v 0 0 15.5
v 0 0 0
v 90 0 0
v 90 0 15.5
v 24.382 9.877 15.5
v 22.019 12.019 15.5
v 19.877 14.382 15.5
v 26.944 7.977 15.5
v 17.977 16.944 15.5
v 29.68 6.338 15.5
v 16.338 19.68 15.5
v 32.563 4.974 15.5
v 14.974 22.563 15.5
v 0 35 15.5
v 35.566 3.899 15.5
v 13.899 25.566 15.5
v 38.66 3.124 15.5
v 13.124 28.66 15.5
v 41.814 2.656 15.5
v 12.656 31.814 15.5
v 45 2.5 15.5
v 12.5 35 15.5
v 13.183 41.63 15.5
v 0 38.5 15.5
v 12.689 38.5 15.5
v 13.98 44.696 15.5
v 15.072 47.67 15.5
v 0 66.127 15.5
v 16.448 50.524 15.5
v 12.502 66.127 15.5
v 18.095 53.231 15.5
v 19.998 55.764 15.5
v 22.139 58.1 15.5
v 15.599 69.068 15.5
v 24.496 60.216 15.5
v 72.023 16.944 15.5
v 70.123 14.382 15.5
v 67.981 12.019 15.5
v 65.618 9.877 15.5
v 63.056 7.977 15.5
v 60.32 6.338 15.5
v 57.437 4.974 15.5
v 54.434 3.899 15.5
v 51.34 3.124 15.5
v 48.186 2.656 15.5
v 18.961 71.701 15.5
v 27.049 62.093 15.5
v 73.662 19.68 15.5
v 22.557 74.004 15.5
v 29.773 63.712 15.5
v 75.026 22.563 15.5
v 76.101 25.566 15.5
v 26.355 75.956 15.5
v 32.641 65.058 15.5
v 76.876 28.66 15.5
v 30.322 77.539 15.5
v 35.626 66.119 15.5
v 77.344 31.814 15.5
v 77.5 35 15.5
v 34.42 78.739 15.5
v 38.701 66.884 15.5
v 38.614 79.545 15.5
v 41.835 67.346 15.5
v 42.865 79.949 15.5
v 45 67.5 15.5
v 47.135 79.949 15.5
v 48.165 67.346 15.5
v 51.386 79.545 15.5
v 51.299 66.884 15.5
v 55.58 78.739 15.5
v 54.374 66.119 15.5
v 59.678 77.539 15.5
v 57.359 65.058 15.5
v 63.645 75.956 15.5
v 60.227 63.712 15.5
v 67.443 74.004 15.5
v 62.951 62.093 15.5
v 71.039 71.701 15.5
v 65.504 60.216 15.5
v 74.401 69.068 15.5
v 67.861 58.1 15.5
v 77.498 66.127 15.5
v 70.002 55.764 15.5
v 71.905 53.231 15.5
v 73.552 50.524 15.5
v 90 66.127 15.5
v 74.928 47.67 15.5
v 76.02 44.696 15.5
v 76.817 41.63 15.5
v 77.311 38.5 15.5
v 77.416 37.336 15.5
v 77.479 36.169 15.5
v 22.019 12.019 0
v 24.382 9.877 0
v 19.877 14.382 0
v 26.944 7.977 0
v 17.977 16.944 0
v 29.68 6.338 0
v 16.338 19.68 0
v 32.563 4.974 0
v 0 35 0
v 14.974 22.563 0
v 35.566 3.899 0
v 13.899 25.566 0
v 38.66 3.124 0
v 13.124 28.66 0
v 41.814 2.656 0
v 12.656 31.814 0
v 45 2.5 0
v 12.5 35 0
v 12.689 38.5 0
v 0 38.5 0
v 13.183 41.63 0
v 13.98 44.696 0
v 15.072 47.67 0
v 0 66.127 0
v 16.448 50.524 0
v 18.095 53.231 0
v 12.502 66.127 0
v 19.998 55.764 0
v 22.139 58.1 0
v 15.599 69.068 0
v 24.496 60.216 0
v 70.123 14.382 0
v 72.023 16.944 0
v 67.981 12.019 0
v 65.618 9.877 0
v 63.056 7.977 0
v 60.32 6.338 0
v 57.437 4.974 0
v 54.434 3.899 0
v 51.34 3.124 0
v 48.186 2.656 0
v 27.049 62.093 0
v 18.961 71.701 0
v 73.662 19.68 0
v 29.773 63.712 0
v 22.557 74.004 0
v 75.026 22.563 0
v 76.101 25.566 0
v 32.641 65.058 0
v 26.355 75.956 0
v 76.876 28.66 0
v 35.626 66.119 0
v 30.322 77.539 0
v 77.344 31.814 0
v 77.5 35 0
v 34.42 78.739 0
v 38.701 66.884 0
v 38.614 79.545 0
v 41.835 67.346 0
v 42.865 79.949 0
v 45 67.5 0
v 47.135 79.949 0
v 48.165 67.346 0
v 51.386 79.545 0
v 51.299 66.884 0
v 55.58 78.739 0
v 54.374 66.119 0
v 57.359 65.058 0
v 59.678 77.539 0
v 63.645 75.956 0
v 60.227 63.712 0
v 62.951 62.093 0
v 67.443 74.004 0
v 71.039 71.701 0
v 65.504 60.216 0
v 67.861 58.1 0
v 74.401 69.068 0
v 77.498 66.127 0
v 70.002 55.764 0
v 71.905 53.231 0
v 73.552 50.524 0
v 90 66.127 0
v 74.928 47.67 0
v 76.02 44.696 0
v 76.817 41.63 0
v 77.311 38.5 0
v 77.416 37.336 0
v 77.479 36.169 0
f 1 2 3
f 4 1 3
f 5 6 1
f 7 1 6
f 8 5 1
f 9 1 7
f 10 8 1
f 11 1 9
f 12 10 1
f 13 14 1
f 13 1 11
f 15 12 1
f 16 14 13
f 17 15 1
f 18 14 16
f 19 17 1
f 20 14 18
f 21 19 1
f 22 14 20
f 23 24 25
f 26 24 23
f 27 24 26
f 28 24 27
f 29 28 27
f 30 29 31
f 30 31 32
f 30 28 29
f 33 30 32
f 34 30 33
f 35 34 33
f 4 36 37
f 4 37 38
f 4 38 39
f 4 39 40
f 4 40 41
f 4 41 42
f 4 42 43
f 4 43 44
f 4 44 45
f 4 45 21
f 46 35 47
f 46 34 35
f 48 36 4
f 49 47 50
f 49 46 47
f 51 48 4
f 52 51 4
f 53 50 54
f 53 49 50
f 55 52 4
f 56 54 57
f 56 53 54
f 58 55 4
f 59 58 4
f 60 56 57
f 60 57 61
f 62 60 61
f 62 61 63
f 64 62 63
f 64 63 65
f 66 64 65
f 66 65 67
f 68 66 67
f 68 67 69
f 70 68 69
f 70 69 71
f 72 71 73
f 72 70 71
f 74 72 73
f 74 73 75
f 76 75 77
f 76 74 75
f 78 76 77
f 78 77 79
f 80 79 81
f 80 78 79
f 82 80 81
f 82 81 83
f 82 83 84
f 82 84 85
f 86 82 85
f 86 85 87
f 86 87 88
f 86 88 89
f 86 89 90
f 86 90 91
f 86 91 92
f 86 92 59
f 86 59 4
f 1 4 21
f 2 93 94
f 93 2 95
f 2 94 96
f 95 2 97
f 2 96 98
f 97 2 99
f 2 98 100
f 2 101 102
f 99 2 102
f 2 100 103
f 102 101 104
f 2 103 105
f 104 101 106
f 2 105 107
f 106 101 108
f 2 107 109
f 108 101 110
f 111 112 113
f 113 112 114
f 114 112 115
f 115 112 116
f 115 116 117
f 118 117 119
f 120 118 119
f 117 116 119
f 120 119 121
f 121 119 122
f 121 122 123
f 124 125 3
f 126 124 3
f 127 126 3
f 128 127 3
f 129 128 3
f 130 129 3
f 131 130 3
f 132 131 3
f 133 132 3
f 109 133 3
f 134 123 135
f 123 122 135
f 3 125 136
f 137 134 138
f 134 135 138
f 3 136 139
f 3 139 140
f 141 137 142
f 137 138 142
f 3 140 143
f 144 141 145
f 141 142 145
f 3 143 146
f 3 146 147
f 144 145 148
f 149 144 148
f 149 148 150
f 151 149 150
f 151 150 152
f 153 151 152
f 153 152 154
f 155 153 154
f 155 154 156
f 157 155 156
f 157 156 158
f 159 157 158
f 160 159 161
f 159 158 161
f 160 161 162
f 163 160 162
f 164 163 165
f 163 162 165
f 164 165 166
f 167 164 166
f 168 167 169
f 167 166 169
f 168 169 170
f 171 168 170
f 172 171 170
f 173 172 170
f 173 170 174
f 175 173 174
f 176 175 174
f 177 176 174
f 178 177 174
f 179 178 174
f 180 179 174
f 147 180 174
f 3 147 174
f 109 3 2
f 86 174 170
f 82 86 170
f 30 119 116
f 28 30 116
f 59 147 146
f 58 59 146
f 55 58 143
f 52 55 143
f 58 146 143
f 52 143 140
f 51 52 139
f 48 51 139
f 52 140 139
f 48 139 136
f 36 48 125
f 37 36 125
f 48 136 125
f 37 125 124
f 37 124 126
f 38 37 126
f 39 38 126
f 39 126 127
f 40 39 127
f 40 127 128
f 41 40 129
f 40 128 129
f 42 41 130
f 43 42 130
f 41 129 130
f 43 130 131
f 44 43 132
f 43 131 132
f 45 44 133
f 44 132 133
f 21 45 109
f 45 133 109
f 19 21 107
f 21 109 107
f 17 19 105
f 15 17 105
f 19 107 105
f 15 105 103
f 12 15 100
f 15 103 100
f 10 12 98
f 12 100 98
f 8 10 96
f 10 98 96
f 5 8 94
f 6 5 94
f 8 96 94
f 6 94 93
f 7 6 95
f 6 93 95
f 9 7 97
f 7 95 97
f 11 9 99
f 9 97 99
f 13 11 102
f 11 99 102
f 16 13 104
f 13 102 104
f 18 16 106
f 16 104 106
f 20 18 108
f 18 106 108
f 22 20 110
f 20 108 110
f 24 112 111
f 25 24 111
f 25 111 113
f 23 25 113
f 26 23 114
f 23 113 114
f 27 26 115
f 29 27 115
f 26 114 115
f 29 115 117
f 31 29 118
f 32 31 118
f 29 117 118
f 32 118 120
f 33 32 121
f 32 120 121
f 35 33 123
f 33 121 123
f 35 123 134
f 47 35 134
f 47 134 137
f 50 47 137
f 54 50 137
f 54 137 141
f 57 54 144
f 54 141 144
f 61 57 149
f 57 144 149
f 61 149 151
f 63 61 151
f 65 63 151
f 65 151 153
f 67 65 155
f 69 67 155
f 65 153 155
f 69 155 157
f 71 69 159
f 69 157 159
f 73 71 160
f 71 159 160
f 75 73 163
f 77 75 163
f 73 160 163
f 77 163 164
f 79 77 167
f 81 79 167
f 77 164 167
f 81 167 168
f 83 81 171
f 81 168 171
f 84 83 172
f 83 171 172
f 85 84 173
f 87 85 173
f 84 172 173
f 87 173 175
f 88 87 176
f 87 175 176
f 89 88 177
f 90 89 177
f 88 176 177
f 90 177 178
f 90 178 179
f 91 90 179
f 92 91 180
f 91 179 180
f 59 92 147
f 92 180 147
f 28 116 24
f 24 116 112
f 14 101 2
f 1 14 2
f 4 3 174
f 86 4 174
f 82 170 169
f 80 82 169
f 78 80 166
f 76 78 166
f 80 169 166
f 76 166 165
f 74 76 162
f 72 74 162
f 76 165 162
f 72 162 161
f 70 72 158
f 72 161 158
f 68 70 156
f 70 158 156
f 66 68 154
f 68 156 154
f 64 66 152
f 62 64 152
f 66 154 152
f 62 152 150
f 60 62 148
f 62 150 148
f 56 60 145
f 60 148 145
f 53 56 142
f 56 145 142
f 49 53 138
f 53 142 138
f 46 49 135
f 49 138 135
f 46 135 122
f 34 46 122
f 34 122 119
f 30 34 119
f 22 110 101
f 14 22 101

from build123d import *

# Parameters (mm, degrees)
F1_DEPTH = 15.5


with BuildPart() as f1:
    # F0 (on Top) → F1 (new body)
    with BuildSketch(Plane.XY):
        with BuildLine():
            Line((0, 35), (0, 0))
            Line((0, 0), (90, 0))
            Line((90, 0), (90, 35))
            Line((90, 35), (90, 38.5))
            Line((90, 38.5), (90, 66.127198))
            Line((90, 66.127198), (77.497654, 66.127198))
            ThreePointArc((77.497654, 66.127198), (45, 80), (12.502346, 66.127198))
            Line((12.502346, 66.127198), (0, 66.127198))
            Line((0, 66.127198), (0, 38.5))
            Line((0, 38.5), (12.689011, 38.5))
            ThreePointArc((12.689011, 38.5), (45, 67.5), (77.310989, 38.5))
            ThreePointArc((77.310989, 38.5), (77.452713, 36.75255), (77.5, 35))
            ThreePointArc((77.5, 35), (45, 2.5), (12.5, 35))
            Line((12.5, 35), (0, 35))
        make_face()
    extrude(amount=F1_DEPTH)


solid = f1.part
